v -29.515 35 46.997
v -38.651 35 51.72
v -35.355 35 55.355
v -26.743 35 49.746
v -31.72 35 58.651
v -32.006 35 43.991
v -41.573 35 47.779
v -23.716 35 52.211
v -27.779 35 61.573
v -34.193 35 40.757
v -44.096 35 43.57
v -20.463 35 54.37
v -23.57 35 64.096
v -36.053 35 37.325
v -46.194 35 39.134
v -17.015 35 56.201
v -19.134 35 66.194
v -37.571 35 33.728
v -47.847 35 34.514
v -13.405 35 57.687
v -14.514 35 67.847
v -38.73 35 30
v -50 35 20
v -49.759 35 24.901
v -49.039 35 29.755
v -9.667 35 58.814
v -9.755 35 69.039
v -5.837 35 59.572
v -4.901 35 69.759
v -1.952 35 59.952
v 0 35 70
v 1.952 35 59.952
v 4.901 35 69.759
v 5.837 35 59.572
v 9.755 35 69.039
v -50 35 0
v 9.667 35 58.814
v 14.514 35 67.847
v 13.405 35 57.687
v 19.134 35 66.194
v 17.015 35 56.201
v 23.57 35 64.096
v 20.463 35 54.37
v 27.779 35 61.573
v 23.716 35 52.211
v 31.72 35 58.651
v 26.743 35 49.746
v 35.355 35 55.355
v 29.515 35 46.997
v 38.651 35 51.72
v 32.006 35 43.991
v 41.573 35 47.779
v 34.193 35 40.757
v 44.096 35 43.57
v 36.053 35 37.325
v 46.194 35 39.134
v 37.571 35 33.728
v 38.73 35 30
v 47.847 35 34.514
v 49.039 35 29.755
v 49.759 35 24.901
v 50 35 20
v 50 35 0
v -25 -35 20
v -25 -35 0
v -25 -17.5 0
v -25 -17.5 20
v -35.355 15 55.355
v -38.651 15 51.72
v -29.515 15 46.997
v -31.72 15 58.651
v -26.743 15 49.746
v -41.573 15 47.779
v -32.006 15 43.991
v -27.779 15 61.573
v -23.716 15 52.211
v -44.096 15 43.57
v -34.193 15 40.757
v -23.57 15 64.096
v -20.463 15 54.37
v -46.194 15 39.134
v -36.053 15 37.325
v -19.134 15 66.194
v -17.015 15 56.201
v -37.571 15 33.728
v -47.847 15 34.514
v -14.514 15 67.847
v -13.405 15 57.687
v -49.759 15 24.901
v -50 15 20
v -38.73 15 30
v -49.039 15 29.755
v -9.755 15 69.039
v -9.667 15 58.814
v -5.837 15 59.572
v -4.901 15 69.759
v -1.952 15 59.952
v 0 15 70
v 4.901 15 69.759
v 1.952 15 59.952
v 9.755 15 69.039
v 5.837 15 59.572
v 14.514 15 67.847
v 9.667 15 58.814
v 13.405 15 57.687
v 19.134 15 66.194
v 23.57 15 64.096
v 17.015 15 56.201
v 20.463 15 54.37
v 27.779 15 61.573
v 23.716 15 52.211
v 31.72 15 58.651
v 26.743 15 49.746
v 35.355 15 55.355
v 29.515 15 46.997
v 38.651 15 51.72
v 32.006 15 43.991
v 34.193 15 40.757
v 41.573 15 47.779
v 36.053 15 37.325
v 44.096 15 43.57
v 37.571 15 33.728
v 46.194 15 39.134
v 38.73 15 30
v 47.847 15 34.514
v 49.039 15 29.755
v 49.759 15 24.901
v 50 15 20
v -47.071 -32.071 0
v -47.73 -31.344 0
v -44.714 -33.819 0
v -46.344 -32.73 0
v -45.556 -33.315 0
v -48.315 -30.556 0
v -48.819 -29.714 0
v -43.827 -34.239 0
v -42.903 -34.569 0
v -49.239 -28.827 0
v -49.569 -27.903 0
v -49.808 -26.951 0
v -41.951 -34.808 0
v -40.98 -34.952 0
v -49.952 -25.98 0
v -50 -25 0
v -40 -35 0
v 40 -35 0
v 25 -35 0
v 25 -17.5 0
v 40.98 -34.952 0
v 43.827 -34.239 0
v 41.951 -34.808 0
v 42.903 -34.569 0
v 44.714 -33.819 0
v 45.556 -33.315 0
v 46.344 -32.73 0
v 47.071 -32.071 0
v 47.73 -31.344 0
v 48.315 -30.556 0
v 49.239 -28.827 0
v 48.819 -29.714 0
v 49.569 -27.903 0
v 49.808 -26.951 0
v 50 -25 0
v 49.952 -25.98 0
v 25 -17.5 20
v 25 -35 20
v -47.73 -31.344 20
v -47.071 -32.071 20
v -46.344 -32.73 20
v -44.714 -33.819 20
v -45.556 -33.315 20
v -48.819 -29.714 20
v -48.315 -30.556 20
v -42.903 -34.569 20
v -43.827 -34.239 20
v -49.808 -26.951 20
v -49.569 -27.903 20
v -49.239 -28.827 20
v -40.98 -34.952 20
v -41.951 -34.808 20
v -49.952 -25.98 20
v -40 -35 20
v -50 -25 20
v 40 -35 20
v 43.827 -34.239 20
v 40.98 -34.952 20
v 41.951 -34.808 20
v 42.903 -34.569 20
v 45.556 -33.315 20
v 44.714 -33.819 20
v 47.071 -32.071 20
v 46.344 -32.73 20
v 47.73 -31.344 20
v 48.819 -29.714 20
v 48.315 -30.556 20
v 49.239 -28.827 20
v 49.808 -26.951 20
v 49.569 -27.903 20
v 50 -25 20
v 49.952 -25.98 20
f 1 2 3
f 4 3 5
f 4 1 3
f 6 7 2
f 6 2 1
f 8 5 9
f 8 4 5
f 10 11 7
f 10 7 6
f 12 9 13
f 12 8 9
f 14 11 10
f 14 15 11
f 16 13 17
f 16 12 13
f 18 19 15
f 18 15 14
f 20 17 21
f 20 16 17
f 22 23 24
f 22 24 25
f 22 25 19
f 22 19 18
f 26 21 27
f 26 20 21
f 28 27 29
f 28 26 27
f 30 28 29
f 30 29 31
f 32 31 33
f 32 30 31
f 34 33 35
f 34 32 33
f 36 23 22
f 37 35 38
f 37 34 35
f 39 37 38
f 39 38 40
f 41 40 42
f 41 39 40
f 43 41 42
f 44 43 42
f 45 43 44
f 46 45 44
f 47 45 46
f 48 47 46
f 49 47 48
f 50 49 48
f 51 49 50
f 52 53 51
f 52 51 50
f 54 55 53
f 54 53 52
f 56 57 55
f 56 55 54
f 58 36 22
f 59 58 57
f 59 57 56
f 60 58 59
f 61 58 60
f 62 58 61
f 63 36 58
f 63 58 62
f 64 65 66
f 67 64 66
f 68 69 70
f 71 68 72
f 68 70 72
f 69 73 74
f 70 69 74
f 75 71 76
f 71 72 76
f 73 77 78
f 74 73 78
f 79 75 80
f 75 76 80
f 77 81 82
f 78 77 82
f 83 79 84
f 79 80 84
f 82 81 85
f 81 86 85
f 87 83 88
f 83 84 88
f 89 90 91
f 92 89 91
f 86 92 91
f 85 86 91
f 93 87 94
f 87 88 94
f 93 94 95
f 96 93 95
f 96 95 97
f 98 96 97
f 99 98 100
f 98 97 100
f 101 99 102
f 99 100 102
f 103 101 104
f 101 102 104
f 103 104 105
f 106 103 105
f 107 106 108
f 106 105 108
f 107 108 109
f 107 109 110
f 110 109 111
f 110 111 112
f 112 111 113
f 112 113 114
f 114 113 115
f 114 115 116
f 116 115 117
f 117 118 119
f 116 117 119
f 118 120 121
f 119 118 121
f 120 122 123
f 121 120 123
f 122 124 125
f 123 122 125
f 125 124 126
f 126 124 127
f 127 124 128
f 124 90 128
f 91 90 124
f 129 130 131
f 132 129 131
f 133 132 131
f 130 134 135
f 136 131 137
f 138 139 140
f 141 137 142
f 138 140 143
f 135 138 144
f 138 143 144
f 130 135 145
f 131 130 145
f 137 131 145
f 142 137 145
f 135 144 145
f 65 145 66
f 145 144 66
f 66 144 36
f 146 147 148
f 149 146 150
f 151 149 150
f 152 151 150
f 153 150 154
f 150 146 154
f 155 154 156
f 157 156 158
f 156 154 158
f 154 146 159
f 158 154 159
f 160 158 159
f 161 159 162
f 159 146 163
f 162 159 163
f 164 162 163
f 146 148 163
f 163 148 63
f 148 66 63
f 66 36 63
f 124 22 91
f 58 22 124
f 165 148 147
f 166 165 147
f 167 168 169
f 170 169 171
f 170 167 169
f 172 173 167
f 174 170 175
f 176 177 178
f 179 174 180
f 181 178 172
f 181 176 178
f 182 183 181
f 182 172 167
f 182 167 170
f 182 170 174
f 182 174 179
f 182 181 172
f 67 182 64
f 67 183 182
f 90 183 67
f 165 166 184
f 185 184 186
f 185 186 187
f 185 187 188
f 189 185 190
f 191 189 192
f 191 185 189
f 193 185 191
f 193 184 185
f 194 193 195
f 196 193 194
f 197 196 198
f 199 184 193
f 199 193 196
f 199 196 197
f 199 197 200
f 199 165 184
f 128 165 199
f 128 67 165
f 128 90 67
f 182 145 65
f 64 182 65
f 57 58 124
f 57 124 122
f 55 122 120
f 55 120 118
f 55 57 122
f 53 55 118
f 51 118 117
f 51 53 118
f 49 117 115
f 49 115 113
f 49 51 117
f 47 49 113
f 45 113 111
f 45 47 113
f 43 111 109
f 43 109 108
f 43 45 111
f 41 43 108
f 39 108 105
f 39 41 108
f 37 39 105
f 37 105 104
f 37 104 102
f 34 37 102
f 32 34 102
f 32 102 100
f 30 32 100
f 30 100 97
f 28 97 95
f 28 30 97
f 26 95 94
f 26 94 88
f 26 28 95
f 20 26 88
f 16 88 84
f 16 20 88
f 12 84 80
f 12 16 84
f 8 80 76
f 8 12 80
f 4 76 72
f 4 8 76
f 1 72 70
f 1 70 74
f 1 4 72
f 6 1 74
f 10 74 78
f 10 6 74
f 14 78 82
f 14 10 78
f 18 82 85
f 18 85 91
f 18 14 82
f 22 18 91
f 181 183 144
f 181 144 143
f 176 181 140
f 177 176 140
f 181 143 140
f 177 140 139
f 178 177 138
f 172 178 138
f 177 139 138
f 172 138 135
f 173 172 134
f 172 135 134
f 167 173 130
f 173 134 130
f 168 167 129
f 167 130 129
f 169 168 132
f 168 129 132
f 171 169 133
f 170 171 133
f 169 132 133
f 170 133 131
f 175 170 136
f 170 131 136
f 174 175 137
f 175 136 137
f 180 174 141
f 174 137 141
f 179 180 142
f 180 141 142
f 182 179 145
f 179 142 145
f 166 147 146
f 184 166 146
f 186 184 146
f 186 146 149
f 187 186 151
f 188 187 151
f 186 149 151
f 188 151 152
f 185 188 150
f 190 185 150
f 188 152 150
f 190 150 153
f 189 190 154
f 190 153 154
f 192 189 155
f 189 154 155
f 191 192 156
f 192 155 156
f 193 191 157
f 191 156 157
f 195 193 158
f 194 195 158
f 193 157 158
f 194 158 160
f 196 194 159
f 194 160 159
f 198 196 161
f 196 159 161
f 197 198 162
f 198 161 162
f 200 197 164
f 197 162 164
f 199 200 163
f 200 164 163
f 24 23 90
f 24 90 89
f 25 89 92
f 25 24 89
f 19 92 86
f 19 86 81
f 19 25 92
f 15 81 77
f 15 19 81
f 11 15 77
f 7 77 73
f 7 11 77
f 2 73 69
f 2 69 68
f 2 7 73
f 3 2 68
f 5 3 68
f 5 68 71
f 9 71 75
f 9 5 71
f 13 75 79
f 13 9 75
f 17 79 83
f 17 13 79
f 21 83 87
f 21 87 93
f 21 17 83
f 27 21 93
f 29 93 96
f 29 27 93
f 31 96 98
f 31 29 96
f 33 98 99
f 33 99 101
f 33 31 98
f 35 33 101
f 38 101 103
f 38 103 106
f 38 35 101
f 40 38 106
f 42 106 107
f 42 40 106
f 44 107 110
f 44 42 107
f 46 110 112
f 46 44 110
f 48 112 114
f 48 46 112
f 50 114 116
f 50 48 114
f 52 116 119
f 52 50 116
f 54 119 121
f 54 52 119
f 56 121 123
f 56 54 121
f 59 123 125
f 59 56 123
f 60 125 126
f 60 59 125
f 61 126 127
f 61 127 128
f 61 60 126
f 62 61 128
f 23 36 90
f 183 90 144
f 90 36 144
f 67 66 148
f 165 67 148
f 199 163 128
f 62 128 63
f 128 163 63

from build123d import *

# Parameters (mm, degrees)
EXTRUDE_1_DEPTH = 20
EXTRUDE_2_DEPTH = 20


with BuildPart() as part:
    # 草圖1 → 填料-伸長1 (new body)
    with BuildSketch(Plane.XY):
        with BuildLine():
            Line((25, -35), (40, -35))
            ThreePointArc((40, -35), (47.071067812, -32.071067812), (50, -25))
            Line((50, -25), (50, 35))
            Line((50, 35), (-50, 35))
            Line((-50, 35), (-50, -25))
            ThreePointArc((-50, -25), (-47.071067812, -32.071067812), (-40, -35))
            Line((-40, -35), (-25, -35))
            Line((-25, -35), (-25, -17.5))
            Line((-25, -17.5), (25, -17.5))
            Line((25, -17.5), (25, -35))
        make_face()
    extrude(amount=EXTRUDE_1_DEPTH)

    # 草圖2 → 填料-伸長2 (add)
    with BuildSketch(Plane(origin=(0, 35, 0), x_dir=(1, 0, 0), z_dir=(0, 1, 0))):
        with BuildLine():
            Line((50, -20), (-50, -20))
            ThreePointArc((-50, -20), (0, -70), (50, -20))
        make_face()
        with BuildLine():
            Line((-38.729833462, -30), (38.729833462, -30))
            ThreePointArc((38.729833462, -30), (0, -60), (-38.729833462, -30))
        make_face(mode=Mode.SUBTRACT)
    extrude(amount=-EXTRUDE_2_DEPTH)


solid = part.part
